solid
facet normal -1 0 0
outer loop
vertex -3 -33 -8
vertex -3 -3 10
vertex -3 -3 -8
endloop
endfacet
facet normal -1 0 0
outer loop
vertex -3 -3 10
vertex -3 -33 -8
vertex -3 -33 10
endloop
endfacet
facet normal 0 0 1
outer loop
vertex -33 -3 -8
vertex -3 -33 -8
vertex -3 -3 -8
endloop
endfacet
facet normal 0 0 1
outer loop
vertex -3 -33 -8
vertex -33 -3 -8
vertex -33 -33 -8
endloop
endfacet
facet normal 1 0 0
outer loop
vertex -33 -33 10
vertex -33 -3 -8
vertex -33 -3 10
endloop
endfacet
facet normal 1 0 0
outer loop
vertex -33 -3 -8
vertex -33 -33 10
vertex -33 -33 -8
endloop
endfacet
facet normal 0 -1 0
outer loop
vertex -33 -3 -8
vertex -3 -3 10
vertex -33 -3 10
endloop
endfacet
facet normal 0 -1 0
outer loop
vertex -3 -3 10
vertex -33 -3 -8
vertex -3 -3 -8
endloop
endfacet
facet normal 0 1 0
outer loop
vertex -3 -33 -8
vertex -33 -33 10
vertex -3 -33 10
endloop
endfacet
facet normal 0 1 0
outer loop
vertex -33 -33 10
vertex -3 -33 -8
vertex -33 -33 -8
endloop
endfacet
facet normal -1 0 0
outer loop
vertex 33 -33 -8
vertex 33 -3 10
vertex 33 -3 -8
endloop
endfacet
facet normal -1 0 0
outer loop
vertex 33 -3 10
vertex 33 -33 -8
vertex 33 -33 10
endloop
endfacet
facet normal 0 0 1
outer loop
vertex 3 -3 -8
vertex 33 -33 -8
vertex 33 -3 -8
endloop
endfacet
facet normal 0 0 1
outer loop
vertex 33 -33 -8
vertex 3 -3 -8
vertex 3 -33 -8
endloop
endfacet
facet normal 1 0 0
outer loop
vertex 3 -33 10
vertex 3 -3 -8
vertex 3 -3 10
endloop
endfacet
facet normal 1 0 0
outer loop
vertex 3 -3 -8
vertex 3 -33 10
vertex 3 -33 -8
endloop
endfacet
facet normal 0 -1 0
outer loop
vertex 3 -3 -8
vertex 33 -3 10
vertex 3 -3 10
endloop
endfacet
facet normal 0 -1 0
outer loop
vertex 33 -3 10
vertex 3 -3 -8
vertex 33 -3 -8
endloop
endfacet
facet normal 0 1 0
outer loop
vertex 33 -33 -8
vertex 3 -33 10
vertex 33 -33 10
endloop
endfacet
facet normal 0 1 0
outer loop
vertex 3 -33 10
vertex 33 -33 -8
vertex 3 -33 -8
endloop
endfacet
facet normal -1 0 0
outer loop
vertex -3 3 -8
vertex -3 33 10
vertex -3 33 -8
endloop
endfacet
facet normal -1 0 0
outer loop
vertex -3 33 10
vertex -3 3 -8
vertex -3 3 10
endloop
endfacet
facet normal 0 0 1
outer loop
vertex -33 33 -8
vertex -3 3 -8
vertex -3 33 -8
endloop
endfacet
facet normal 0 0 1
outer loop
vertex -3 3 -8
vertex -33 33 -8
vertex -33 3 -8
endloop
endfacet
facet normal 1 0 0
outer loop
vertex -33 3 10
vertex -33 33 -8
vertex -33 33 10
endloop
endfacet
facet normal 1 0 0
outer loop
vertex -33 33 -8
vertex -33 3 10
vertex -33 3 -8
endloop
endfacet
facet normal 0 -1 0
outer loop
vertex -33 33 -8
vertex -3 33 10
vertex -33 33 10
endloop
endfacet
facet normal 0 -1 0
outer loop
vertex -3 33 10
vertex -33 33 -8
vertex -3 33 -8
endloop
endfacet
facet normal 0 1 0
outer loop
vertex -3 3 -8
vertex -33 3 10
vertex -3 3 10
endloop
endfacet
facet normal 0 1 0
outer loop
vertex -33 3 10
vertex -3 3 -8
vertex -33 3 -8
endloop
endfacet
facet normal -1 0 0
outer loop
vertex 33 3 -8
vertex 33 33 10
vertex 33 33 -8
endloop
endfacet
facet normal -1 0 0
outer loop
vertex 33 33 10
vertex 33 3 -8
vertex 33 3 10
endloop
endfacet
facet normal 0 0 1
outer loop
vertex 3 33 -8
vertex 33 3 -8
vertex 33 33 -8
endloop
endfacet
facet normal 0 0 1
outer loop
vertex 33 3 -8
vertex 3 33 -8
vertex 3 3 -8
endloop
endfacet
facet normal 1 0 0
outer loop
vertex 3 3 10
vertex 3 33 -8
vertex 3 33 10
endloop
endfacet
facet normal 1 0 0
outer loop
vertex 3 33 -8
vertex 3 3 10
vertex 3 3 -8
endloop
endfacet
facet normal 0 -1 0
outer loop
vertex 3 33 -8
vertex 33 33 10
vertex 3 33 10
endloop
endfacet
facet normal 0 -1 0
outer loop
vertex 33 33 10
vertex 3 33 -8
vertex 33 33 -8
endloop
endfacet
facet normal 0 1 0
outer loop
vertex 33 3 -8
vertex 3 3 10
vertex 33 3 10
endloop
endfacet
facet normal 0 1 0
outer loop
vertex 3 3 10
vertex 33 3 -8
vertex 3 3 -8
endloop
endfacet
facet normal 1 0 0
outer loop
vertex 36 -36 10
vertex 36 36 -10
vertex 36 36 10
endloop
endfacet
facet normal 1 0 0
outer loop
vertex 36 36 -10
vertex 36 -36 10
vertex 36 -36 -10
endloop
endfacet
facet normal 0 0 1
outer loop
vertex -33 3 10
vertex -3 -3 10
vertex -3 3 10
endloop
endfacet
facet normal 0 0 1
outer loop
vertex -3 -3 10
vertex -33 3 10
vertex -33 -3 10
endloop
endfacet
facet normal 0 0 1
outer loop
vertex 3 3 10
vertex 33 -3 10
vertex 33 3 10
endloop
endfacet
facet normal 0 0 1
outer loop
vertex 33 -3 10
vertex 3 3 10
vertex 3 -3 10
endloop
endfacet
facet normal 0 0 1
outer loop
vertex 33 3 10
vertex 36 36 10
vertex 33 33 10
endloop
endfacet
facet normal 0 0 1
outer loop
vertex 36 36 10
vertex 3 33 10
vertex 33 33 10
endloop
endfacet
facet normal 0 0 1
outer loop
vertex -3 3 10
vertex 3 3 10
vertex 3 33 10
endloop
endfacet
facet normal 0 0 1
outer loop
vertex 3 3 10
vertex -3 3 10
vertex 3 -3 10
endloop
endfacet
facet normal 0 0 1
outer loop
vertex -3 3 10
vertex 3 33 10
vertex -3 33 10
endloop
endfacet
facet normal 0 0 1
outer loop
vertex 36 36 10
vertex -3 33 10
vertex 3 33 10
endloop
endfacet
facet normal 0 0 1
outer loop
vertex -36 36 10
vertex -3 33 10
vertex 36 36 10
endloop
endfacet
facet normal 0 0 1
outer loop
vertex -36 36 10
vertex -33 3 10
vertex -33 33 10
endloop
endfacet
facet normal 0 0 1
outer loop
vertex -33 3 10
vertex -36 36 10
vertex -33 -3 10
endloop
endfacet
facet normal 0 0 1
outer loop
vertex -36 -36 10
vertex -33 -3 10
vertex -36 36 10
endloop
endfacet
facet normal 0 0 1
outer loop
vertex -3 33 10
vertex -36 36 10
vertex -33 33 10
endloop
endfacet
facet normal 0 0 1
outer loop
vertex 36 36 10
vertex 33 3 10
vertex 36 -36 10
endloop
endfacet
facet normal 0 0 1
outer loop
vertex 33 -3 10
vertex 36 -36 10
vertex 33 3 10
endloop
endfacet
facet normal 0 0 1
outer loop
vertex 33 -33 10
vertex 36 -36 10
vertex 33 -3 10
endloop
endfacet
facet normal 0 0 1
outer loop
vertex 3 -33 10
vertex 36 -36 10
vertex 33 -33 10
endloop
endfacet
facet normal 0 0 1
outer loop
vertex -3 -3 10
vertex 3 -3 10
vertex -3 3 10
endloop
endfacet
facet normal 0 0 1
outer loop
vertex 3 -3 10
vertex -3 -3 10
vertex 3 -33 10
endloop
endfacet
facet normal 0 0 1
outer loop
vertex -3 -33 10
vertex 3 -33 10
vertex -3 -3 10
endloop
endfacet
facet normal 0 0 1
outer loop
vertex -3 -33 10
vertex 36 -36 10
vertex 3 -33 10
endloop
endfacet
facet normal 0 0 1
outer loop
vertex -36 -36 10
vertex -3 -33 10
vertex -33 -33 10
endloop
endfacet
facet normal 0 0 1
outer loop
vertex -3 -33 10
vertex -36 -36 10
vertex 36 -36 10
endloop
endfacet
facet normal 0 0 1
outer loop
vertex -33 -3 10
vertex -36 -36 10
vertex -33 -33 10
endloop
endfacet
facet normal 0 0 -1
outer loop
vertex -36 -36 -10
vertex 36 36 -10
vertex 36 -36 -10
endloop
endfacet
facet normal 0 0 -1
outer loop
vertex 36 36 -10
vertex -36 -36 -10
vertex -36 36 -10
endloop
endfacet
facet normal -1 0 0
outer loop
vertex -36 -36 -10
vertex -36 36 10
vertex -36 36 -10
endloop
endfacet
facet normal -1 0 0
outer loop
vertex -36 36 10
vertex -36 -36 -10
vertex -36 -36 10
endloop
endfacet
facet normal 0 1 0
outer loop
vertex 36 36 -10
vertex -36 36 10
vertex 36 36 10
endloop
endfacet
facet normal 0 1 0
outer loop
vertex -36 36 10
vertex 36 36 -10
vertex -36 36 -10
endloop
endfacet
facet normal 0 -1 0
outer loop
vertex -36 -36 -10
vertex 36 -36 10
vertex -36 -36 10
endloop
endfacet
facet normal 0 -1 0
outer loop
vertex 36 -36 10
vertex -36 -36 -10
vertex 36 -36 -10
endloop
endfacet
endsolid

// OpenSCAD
$fn = 32;

// ----------------------------------------------------------------------
// Pocket plate 72 x 72 x 20
// 2 x 2 pockets 30 mm square, 18 mm deep
// ----------------------------------------------------------------------

// --- parameters (mm) ---
thickness = 20;  // plate thickness
floor_t = 2;     // material left under each pocket
pocket = 30;     // pocket side length
pitch_x = 36;    // pocket pitch along X
pitch_y = 36;    // pocket pitch along Y
cols = 2;        // pockets per row
rows = 2;        // rows of pockets

// --- derived feature positions (mm) ---
depth = thickness - floor_t;        // = 18   pocket depth, down to the floor
span_x = (cols - 1) * pitch_x;      // = 36   distance between outer pockets
span_y = (rows - 1) * pitch_y;      // = 36   distance between outer pocket rows
origin_x = -span_x / 2;             // = -18   X of the first pocket
origin_y = -span_y / 2;             // = -18   Y of the first pocket
plate = [span_x + pocket + 6, span_y + pocket + 6, thickness];  // = [72, 72, 20]   overall size: pockets plus 3 mm of wall on each side
feature_centers = [
  [origin_x + 0 * pitch_x, origin_y + 0 * pitch_y],
  [origin_x + 1 * pitch_x, origin_y + 0 * pitch_y],
  [origin_x + 0 * pitch_x, origin_y + 1 * pitch_y],
  [origin_x + 1 * pitch_x, origin_y + 1 * pitch_y]
];   // pocket centres, used verbatim by the cutter loop

// plate outline, then one pocket per centre in feature_centers
difference() {
  cube(plate, center = true);
  for (centre = feature_centers)
    translate([centre[0] - pocket / 2, centre[1] - pocket / 2, plate[2] / 2 - depth])
      cube([pocket, pocket, depth + 1]);  // centred on the declared pocket centre
}
